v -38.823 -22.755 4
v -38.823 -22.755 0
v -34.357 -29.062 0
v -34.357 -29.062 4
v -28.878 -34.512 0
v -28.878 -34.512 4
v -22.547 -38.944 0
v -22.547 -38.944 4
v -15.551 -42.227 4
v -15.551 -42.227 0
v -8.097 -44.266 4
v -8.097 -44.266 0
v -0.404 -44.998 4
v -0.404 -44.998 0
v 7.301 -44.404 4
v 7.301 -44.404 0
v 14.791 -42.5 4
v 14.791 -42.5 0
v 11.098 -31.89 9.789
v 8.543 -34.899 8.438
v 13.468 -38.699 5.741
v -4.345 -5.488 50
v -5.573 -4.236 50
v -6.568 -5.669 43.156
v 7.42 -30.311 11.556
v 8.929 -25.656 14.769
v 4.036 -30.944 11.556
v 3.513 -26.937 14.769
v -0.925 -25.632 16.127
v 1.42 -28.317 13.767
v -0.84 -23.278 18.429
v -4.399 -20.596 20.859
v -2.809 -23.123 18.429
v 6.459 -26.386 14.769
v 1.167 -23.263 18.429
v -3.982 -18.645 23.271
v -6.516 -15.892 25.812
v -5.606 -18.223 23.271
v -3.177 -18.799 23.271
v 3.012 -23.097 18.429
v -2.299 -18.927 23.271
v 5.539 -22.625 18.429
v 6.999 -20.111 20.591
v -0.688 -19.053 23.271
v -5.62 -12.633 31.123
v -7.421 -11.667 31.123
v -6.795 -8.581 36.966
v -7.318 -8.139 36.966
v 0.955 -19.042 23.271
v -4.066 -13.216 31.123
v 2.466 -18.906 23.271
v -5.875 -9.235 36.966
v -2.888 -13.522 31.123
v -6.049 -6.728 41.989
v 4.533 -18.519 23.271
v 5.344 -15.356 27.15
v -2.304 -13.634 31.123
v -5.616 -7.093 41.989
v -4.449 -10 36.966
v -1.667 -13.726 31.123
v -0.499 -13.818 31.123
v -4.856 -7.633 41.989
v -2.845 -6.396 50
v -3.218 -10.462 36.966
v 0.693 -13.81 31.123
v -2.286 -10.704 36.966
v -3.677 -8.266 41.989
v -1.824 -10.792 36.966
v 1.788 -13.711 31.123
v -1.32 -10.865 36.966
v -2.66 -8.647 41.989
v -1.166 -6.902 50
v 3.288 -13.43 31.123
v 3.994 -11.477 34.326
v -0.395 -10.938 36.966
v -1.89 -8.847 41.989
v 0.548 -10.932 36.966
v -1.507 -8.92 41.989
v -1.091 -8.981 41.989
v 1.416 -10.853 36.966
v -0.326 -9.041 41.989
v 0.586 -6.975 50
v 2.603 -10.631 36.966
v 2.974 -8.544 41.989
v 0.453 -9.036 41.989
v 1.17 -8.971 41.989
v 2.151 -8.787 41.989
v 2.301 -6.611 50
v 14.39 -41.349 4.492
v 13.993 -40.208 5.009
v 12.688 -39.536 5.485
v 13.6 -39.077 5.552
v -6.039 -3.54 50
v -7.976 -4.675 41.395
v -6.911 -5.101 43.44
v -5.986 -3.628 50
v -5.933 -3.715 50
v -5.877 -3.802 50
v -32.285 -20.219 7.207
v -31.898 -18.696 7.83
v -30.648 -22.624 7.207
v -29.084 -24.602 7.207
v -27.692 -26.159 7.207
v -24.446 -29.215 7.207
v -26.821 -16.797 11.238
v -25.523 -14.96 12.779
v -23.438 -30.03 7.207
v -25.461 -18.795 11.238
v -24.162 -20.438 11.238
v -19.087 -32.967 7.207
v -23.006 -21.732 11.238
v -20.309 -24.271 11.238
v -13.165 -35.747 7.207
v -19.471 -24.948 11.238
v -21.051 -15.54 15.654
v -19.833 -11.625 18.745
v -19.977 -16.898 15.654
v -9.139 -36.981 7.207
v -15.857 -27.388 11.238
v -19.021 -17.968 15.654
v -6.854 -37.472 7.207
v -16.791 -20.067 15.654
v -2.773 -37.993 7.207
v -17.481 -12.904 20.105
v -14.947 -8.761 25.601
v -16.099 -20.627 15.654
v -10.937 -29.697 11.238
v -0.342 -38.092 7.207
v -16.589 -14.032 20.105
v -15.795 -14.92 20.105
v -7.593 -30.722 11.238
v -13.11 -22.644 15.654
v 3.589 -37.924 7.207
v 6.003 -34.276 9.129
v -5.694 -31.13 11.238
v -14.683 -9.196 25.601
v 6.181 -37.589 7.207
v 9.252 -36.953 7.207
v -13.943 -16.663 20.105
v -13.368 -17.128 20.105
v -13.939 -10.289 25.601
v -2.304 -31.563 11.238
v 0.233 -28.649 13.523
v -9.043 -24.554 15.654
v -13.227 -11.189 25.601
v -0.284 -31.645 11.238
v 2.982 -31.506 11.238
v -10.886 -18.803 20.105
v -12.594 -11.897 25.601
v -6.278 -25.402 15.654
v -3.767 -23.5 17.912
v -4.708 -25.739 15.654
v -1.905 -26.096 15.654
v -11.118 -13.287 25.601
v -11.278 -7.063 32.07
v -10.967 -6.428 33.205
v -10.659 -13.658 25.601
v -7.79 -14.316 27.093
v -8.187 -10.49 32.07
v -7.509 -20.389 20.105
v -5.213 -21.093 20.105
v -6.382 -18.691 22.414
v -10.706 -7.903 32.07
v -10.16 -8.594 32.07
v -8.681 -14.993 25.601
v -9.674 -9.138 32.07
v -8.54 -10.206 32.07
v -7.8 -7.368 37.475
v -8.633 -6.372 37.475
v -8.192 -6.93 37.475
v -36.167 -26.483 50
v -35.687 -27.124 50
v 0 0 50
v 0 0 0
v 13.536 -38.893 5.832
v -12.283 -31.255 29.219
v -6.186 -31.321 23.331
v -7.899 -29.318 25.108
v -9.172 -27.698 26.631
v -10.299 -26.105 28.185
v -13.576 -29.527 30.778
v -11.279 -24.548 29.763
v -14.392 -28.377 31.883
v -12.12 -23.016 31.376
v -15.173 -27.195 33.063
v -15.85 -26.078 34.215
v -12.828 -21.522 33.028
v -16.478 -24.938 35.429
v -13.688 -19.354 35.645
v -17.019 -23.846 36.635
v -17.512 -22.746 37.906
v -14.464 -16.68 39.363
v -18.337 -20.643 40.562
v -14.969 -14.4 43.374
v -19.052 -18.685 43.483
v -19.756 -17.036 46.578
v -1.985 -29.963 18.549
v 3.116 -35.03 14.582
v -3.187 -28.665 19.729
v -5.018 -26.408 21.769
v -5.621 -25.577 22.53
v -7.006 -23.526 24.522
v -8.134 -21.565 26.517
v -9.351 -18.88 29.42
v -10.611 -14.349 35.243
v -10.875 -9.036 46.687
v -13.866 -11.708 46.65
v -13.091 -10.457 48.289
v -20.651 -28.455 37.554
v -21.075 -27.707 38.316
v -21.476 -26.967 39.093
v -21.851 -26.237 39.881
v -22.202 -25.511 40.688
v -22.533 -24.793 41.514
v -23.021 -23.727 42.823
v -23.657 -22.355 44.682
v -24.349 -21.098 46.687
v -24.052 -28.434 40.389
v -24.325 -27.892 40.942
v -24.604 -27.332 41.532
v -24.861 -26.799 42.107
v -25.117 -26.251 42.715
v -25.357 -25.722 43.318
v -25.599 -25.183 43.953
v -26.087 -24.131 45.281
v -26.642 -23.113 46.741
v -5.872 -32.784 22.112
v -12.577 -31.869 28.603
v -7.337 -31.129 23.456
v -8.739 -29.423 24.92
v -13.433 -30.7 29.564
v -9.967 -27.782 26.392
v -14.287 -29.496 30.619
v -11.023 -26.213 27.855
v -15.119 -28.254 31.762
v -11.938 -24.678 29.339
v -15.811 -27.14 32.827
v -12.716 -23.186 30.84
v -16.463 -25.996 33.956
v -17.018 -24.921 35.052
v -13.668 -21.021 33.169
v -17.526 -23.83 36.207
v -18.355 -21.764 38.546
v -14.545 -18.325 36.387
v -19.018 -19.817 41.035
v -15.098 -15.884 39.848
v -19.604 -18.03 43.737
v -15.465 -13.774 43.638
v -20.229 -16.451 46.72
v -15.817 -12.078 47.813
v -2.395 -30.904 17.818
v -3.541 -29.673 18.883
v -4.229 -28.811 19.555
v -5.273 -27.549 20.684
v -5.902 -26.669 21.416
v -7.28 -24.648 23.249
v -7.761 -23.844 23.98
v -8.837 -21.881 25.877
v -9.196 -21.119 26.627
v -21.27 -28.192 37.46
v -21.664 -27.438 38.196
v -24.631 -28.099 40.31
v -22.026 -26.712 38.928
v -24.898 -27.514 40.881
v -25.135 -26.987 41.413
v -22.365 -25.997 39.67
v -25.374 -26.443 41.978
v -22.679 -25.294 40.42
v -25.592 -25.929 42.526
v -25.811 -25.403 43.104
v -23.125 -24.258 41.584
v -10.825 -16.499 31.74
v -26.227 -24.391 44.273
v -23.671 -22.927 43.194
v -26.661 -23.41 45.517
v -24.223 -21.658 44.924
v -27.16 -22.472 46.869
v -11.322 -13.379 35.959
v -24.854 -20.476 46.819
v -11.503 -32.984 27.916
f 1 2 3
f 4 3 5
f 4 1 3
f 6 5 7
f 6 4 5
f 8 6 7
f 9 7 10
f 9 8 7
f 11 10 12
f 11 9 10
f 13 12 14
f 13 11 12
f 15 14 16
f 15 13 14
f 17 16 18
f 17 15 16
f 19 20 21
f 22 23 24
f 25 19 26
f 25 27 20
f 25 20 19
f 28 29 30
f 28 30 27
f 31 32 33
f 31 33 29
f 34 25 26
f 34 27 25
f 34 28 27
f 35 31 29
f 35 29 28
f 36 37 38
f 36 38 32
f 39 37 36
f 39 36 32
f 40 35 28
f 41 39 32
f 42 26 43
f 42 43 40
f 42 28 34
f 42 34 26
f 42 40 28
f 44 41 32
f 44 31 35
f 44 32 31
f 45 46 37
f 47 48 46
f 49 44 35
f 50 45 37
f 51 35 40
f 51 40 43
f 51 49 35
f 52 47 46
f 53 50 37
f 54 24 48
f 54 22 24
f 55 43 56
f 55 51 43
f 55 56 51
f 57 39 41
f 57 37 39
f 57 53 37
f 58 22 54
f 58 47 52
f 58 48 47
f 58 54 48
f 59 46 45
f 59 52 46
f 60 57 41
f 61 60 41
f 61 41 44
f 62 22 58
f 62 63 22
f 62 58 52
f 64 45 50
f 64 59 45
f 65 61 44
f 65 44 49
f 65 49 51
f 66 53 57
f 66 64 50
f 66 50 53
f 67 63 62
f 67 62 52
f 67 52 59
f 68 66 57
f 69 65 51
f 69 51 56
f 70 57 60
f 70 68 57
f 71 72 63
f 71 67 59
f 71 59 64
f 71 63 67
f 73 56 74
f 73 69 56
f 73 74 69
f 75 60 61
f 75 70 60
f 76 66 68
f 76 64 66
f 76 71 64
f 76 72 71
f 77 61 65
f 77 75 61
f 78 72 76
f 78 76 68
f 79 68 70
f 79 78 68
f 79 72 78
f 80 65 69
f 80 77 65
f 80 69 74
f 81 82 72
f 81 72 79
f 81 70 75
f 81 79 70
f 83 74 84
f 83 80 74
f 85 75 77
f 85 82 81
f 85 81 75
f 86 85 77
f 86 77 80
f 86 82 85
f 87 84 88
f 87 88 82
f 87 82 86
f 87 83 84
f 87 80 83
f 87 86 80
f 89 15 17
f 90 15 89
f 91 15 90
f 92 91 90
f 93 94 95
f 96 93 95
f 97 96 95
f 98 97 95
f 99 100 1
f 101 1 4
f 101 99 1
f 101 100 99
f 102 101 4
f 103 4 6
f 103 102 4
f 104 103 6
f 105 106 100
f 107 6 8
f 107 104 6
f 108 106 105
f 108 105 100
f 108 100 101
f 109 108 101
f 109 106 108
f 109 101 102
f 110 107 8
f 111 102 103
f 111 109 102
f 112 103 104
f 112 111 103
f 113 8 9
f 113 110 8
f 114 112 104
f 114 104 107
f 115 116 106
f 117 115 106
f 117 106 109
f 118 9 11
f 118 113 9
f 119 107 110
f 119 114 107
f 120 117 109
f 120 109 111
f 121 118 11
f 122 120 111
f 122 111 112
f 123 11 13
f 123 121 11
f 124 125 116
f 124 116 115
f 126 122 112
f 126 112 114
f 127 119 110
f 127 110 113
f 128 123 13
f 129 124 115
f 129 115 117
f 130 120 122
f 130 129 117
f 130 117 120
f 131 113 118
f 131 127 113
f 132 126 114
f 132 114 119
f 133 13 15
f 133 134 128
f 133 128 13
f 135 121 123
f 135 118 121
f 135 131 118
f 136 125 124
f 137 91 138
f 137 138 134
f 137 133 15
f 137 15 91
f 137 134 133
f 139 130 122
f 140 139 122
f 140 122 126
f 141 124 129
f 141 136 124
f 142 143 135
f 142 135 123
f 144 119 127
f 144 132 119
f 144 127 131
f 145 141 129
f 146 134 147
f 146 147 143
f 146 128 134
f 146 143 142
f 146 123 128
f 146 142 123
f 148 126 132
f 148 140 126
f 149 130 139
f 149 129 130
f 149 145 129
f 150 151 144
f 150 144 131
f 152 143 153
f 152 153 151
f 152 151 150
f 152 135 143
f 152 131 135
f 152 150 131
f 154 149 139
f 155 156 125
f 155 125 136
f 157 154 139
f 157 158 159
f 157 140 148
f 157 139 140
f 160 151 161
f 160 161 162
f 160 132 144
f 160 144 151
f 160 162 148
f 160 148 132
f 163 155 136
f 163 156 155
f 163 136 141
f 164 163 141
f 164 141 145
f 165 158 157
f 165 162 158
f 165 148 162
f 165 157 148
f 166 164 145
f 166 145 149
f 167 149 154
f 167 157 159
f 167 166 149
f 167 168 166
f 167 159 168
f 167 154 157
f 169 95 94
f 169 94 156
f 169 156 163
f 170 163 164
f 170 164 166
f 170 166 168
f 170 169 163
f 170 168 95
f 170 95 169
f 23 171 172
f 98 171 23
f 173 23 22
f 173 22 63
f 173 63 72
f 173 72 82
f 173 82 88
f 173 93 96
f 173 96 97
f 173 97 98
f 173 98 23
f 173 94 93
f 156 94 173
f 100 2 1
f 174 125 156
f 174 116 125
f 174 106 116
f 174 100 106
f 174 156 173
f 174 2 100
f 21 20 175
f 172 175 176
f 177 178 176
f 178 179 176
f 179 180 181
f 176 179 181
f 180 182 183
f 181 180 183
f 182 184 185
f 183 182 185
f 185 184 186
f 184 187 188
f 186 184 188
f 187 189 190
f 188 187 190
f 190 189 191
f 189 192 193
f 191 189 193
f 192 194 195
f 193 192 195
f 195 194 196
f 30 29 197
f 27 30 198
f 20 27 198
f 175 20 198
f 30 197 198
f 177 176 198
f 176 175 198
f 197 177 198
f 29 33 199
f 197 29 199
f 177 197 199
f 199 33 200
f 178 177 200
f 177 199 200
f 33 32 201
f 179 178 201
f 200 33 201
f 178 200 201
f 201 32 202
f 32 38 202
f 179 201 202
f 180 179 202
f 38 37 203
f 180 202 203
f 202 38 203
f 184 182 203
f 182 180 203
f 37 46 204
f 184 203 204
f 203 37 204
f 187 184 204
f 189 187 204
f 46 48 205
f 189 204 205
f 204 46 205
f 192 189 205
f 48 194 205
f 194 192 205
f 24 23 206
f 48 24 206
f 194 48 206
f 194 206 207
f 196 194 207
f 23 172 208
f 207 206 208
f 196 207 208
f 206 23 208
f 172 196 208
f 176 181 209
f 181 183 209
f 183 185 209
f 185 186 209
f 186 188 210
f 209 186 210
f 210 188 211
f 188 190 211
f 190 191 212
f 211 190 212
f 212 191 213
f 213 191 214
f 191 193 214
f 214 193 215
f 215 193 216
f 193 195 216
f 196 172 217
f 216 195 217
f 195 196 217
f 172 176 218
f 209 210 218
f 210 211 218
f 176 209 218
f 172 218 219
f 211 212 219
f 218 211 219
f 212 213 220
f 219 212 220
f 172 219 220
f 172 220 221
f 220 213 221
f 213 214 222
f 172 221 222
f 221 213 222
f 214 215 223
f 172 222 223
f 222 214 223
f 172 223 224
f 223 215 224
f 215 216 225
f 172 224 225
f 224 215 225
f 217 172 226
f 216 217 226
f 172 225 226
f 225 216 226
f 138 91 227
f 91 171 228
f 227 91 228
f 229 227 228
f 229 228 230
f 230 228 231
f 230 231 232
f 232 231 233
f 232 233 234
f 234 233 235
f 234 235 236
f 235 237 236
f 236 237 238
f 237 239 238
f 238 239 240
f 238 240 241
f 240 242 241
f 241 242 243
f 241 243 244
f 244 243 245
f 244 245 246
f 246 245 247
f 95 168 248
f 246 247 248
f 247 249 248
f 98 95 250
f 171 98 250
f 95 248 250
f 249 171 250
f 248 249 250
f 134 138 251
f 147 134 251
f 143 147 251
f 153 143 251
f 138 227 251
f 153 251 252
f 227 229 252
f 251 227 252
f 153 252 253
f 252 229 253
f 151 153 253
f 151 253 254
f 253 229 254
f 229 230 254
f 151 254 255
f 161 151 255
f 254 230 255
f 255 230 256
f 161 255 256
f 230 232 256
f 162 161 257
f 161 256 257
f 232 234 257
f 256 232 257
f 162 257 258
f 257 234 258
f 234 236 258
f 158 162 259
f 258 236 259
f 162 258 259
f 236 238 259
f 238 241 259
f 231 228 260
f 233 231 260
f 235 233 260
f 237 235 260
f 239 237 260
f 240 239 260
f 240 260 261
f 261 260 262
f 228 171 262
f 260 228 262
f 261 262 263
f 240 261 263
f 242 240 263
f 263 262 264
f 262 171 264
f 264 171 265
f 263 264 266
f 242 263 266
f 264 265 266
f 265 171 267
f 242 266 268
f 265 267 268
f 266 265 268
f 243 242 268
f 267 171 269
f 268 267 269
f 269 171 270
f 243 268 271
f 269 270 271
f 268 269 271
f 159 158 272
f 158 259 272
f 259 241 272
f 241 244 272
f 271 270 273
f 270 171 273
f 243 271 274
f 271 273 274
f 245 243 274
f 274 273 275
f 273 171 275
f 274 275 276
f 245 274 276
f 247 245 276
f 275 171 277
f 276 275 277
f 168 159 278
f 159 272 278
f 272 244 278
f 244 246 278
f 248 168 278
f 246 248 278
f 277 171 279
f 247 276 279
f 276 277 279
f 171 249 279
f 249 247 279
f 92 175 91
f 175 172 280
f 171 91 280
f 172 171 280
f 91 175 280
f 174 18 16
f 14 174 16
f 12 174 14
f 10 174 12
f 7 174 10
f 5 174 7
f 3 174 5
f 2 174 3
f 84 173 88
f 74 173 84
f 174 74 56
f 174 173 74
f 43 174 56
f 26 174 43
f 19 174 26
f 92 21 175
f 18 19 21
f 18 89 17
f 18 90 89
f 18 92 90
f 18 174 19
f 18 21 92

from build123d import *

# Parameters (mm, degrees)
F7_DEPTH = 66.294


with BuildPart() as f1:
    # F0 (on Front) → F1 (revolve)
    with BuildSketch(Plane.XZ):
        with BuildLine():
            Line((0, 50), (0, 0))
            Line((0, 0), (45, 0))
            Line((45, 0), (45, 4))
            ThreePointArc((45, 4), (20.032482, 22.070311), (7, 50))
            Line((7, 50), (0, 50))
        make_face()
    revolve(axis=Axis((0, 0, 25), (0, 0, 1)))

    # F3 (on offset) → F5 section 0
    with BuildSketch(Plane(origin=(0, 0, 0), x_dir=(1, 0, 0), z_dir=(0, 0, -1))):
        with BuildLine():
            ThreePointArc((18.70692, 41.144319), (5.441077, 22.350987), (0, 0))
            Line((0, 0), (1.5, 0))
            ThreePointArc((1.5, 0), (7.30349, 21.810899), (20.034988, 40.447013))
            Line((20.034988, 40.447013), (18.70692, 41.144319))
        make_face()
    # F4 (on face) → F5 section 1
    with BuildSketch(Plane.XY.offset(50)):
        with BuildLine():
            Line((-35.687151, -27.123697), (-5.573025, -4.235728))
            ThreePointArc((-5.573025, -4.235728), (-5.72933, -4.021788), (-5.877426, -3.802087))
            Line((-5.877426, -3.802087), (-36.166668, -26.483335))
            Line((-36.166668, -26.483335), (-35.687151, -27.123697))
        make_face()
    loft()

    # F6 (on Top) → F7 (cut)
    with BuildSketch(Plane.XY):
        Polygon((-48.766669, -28.583335), (0, 0), (24.18991, -69.506563), (50.104998, -75.30845), (58.227632, 43.516669), (31.925756, 47.691509), (-48.766669, 43.516669), align=None)
    extrude(amount=F7_DEPTH, mode=Mode.SUBTRACT)


solid = f1.part
